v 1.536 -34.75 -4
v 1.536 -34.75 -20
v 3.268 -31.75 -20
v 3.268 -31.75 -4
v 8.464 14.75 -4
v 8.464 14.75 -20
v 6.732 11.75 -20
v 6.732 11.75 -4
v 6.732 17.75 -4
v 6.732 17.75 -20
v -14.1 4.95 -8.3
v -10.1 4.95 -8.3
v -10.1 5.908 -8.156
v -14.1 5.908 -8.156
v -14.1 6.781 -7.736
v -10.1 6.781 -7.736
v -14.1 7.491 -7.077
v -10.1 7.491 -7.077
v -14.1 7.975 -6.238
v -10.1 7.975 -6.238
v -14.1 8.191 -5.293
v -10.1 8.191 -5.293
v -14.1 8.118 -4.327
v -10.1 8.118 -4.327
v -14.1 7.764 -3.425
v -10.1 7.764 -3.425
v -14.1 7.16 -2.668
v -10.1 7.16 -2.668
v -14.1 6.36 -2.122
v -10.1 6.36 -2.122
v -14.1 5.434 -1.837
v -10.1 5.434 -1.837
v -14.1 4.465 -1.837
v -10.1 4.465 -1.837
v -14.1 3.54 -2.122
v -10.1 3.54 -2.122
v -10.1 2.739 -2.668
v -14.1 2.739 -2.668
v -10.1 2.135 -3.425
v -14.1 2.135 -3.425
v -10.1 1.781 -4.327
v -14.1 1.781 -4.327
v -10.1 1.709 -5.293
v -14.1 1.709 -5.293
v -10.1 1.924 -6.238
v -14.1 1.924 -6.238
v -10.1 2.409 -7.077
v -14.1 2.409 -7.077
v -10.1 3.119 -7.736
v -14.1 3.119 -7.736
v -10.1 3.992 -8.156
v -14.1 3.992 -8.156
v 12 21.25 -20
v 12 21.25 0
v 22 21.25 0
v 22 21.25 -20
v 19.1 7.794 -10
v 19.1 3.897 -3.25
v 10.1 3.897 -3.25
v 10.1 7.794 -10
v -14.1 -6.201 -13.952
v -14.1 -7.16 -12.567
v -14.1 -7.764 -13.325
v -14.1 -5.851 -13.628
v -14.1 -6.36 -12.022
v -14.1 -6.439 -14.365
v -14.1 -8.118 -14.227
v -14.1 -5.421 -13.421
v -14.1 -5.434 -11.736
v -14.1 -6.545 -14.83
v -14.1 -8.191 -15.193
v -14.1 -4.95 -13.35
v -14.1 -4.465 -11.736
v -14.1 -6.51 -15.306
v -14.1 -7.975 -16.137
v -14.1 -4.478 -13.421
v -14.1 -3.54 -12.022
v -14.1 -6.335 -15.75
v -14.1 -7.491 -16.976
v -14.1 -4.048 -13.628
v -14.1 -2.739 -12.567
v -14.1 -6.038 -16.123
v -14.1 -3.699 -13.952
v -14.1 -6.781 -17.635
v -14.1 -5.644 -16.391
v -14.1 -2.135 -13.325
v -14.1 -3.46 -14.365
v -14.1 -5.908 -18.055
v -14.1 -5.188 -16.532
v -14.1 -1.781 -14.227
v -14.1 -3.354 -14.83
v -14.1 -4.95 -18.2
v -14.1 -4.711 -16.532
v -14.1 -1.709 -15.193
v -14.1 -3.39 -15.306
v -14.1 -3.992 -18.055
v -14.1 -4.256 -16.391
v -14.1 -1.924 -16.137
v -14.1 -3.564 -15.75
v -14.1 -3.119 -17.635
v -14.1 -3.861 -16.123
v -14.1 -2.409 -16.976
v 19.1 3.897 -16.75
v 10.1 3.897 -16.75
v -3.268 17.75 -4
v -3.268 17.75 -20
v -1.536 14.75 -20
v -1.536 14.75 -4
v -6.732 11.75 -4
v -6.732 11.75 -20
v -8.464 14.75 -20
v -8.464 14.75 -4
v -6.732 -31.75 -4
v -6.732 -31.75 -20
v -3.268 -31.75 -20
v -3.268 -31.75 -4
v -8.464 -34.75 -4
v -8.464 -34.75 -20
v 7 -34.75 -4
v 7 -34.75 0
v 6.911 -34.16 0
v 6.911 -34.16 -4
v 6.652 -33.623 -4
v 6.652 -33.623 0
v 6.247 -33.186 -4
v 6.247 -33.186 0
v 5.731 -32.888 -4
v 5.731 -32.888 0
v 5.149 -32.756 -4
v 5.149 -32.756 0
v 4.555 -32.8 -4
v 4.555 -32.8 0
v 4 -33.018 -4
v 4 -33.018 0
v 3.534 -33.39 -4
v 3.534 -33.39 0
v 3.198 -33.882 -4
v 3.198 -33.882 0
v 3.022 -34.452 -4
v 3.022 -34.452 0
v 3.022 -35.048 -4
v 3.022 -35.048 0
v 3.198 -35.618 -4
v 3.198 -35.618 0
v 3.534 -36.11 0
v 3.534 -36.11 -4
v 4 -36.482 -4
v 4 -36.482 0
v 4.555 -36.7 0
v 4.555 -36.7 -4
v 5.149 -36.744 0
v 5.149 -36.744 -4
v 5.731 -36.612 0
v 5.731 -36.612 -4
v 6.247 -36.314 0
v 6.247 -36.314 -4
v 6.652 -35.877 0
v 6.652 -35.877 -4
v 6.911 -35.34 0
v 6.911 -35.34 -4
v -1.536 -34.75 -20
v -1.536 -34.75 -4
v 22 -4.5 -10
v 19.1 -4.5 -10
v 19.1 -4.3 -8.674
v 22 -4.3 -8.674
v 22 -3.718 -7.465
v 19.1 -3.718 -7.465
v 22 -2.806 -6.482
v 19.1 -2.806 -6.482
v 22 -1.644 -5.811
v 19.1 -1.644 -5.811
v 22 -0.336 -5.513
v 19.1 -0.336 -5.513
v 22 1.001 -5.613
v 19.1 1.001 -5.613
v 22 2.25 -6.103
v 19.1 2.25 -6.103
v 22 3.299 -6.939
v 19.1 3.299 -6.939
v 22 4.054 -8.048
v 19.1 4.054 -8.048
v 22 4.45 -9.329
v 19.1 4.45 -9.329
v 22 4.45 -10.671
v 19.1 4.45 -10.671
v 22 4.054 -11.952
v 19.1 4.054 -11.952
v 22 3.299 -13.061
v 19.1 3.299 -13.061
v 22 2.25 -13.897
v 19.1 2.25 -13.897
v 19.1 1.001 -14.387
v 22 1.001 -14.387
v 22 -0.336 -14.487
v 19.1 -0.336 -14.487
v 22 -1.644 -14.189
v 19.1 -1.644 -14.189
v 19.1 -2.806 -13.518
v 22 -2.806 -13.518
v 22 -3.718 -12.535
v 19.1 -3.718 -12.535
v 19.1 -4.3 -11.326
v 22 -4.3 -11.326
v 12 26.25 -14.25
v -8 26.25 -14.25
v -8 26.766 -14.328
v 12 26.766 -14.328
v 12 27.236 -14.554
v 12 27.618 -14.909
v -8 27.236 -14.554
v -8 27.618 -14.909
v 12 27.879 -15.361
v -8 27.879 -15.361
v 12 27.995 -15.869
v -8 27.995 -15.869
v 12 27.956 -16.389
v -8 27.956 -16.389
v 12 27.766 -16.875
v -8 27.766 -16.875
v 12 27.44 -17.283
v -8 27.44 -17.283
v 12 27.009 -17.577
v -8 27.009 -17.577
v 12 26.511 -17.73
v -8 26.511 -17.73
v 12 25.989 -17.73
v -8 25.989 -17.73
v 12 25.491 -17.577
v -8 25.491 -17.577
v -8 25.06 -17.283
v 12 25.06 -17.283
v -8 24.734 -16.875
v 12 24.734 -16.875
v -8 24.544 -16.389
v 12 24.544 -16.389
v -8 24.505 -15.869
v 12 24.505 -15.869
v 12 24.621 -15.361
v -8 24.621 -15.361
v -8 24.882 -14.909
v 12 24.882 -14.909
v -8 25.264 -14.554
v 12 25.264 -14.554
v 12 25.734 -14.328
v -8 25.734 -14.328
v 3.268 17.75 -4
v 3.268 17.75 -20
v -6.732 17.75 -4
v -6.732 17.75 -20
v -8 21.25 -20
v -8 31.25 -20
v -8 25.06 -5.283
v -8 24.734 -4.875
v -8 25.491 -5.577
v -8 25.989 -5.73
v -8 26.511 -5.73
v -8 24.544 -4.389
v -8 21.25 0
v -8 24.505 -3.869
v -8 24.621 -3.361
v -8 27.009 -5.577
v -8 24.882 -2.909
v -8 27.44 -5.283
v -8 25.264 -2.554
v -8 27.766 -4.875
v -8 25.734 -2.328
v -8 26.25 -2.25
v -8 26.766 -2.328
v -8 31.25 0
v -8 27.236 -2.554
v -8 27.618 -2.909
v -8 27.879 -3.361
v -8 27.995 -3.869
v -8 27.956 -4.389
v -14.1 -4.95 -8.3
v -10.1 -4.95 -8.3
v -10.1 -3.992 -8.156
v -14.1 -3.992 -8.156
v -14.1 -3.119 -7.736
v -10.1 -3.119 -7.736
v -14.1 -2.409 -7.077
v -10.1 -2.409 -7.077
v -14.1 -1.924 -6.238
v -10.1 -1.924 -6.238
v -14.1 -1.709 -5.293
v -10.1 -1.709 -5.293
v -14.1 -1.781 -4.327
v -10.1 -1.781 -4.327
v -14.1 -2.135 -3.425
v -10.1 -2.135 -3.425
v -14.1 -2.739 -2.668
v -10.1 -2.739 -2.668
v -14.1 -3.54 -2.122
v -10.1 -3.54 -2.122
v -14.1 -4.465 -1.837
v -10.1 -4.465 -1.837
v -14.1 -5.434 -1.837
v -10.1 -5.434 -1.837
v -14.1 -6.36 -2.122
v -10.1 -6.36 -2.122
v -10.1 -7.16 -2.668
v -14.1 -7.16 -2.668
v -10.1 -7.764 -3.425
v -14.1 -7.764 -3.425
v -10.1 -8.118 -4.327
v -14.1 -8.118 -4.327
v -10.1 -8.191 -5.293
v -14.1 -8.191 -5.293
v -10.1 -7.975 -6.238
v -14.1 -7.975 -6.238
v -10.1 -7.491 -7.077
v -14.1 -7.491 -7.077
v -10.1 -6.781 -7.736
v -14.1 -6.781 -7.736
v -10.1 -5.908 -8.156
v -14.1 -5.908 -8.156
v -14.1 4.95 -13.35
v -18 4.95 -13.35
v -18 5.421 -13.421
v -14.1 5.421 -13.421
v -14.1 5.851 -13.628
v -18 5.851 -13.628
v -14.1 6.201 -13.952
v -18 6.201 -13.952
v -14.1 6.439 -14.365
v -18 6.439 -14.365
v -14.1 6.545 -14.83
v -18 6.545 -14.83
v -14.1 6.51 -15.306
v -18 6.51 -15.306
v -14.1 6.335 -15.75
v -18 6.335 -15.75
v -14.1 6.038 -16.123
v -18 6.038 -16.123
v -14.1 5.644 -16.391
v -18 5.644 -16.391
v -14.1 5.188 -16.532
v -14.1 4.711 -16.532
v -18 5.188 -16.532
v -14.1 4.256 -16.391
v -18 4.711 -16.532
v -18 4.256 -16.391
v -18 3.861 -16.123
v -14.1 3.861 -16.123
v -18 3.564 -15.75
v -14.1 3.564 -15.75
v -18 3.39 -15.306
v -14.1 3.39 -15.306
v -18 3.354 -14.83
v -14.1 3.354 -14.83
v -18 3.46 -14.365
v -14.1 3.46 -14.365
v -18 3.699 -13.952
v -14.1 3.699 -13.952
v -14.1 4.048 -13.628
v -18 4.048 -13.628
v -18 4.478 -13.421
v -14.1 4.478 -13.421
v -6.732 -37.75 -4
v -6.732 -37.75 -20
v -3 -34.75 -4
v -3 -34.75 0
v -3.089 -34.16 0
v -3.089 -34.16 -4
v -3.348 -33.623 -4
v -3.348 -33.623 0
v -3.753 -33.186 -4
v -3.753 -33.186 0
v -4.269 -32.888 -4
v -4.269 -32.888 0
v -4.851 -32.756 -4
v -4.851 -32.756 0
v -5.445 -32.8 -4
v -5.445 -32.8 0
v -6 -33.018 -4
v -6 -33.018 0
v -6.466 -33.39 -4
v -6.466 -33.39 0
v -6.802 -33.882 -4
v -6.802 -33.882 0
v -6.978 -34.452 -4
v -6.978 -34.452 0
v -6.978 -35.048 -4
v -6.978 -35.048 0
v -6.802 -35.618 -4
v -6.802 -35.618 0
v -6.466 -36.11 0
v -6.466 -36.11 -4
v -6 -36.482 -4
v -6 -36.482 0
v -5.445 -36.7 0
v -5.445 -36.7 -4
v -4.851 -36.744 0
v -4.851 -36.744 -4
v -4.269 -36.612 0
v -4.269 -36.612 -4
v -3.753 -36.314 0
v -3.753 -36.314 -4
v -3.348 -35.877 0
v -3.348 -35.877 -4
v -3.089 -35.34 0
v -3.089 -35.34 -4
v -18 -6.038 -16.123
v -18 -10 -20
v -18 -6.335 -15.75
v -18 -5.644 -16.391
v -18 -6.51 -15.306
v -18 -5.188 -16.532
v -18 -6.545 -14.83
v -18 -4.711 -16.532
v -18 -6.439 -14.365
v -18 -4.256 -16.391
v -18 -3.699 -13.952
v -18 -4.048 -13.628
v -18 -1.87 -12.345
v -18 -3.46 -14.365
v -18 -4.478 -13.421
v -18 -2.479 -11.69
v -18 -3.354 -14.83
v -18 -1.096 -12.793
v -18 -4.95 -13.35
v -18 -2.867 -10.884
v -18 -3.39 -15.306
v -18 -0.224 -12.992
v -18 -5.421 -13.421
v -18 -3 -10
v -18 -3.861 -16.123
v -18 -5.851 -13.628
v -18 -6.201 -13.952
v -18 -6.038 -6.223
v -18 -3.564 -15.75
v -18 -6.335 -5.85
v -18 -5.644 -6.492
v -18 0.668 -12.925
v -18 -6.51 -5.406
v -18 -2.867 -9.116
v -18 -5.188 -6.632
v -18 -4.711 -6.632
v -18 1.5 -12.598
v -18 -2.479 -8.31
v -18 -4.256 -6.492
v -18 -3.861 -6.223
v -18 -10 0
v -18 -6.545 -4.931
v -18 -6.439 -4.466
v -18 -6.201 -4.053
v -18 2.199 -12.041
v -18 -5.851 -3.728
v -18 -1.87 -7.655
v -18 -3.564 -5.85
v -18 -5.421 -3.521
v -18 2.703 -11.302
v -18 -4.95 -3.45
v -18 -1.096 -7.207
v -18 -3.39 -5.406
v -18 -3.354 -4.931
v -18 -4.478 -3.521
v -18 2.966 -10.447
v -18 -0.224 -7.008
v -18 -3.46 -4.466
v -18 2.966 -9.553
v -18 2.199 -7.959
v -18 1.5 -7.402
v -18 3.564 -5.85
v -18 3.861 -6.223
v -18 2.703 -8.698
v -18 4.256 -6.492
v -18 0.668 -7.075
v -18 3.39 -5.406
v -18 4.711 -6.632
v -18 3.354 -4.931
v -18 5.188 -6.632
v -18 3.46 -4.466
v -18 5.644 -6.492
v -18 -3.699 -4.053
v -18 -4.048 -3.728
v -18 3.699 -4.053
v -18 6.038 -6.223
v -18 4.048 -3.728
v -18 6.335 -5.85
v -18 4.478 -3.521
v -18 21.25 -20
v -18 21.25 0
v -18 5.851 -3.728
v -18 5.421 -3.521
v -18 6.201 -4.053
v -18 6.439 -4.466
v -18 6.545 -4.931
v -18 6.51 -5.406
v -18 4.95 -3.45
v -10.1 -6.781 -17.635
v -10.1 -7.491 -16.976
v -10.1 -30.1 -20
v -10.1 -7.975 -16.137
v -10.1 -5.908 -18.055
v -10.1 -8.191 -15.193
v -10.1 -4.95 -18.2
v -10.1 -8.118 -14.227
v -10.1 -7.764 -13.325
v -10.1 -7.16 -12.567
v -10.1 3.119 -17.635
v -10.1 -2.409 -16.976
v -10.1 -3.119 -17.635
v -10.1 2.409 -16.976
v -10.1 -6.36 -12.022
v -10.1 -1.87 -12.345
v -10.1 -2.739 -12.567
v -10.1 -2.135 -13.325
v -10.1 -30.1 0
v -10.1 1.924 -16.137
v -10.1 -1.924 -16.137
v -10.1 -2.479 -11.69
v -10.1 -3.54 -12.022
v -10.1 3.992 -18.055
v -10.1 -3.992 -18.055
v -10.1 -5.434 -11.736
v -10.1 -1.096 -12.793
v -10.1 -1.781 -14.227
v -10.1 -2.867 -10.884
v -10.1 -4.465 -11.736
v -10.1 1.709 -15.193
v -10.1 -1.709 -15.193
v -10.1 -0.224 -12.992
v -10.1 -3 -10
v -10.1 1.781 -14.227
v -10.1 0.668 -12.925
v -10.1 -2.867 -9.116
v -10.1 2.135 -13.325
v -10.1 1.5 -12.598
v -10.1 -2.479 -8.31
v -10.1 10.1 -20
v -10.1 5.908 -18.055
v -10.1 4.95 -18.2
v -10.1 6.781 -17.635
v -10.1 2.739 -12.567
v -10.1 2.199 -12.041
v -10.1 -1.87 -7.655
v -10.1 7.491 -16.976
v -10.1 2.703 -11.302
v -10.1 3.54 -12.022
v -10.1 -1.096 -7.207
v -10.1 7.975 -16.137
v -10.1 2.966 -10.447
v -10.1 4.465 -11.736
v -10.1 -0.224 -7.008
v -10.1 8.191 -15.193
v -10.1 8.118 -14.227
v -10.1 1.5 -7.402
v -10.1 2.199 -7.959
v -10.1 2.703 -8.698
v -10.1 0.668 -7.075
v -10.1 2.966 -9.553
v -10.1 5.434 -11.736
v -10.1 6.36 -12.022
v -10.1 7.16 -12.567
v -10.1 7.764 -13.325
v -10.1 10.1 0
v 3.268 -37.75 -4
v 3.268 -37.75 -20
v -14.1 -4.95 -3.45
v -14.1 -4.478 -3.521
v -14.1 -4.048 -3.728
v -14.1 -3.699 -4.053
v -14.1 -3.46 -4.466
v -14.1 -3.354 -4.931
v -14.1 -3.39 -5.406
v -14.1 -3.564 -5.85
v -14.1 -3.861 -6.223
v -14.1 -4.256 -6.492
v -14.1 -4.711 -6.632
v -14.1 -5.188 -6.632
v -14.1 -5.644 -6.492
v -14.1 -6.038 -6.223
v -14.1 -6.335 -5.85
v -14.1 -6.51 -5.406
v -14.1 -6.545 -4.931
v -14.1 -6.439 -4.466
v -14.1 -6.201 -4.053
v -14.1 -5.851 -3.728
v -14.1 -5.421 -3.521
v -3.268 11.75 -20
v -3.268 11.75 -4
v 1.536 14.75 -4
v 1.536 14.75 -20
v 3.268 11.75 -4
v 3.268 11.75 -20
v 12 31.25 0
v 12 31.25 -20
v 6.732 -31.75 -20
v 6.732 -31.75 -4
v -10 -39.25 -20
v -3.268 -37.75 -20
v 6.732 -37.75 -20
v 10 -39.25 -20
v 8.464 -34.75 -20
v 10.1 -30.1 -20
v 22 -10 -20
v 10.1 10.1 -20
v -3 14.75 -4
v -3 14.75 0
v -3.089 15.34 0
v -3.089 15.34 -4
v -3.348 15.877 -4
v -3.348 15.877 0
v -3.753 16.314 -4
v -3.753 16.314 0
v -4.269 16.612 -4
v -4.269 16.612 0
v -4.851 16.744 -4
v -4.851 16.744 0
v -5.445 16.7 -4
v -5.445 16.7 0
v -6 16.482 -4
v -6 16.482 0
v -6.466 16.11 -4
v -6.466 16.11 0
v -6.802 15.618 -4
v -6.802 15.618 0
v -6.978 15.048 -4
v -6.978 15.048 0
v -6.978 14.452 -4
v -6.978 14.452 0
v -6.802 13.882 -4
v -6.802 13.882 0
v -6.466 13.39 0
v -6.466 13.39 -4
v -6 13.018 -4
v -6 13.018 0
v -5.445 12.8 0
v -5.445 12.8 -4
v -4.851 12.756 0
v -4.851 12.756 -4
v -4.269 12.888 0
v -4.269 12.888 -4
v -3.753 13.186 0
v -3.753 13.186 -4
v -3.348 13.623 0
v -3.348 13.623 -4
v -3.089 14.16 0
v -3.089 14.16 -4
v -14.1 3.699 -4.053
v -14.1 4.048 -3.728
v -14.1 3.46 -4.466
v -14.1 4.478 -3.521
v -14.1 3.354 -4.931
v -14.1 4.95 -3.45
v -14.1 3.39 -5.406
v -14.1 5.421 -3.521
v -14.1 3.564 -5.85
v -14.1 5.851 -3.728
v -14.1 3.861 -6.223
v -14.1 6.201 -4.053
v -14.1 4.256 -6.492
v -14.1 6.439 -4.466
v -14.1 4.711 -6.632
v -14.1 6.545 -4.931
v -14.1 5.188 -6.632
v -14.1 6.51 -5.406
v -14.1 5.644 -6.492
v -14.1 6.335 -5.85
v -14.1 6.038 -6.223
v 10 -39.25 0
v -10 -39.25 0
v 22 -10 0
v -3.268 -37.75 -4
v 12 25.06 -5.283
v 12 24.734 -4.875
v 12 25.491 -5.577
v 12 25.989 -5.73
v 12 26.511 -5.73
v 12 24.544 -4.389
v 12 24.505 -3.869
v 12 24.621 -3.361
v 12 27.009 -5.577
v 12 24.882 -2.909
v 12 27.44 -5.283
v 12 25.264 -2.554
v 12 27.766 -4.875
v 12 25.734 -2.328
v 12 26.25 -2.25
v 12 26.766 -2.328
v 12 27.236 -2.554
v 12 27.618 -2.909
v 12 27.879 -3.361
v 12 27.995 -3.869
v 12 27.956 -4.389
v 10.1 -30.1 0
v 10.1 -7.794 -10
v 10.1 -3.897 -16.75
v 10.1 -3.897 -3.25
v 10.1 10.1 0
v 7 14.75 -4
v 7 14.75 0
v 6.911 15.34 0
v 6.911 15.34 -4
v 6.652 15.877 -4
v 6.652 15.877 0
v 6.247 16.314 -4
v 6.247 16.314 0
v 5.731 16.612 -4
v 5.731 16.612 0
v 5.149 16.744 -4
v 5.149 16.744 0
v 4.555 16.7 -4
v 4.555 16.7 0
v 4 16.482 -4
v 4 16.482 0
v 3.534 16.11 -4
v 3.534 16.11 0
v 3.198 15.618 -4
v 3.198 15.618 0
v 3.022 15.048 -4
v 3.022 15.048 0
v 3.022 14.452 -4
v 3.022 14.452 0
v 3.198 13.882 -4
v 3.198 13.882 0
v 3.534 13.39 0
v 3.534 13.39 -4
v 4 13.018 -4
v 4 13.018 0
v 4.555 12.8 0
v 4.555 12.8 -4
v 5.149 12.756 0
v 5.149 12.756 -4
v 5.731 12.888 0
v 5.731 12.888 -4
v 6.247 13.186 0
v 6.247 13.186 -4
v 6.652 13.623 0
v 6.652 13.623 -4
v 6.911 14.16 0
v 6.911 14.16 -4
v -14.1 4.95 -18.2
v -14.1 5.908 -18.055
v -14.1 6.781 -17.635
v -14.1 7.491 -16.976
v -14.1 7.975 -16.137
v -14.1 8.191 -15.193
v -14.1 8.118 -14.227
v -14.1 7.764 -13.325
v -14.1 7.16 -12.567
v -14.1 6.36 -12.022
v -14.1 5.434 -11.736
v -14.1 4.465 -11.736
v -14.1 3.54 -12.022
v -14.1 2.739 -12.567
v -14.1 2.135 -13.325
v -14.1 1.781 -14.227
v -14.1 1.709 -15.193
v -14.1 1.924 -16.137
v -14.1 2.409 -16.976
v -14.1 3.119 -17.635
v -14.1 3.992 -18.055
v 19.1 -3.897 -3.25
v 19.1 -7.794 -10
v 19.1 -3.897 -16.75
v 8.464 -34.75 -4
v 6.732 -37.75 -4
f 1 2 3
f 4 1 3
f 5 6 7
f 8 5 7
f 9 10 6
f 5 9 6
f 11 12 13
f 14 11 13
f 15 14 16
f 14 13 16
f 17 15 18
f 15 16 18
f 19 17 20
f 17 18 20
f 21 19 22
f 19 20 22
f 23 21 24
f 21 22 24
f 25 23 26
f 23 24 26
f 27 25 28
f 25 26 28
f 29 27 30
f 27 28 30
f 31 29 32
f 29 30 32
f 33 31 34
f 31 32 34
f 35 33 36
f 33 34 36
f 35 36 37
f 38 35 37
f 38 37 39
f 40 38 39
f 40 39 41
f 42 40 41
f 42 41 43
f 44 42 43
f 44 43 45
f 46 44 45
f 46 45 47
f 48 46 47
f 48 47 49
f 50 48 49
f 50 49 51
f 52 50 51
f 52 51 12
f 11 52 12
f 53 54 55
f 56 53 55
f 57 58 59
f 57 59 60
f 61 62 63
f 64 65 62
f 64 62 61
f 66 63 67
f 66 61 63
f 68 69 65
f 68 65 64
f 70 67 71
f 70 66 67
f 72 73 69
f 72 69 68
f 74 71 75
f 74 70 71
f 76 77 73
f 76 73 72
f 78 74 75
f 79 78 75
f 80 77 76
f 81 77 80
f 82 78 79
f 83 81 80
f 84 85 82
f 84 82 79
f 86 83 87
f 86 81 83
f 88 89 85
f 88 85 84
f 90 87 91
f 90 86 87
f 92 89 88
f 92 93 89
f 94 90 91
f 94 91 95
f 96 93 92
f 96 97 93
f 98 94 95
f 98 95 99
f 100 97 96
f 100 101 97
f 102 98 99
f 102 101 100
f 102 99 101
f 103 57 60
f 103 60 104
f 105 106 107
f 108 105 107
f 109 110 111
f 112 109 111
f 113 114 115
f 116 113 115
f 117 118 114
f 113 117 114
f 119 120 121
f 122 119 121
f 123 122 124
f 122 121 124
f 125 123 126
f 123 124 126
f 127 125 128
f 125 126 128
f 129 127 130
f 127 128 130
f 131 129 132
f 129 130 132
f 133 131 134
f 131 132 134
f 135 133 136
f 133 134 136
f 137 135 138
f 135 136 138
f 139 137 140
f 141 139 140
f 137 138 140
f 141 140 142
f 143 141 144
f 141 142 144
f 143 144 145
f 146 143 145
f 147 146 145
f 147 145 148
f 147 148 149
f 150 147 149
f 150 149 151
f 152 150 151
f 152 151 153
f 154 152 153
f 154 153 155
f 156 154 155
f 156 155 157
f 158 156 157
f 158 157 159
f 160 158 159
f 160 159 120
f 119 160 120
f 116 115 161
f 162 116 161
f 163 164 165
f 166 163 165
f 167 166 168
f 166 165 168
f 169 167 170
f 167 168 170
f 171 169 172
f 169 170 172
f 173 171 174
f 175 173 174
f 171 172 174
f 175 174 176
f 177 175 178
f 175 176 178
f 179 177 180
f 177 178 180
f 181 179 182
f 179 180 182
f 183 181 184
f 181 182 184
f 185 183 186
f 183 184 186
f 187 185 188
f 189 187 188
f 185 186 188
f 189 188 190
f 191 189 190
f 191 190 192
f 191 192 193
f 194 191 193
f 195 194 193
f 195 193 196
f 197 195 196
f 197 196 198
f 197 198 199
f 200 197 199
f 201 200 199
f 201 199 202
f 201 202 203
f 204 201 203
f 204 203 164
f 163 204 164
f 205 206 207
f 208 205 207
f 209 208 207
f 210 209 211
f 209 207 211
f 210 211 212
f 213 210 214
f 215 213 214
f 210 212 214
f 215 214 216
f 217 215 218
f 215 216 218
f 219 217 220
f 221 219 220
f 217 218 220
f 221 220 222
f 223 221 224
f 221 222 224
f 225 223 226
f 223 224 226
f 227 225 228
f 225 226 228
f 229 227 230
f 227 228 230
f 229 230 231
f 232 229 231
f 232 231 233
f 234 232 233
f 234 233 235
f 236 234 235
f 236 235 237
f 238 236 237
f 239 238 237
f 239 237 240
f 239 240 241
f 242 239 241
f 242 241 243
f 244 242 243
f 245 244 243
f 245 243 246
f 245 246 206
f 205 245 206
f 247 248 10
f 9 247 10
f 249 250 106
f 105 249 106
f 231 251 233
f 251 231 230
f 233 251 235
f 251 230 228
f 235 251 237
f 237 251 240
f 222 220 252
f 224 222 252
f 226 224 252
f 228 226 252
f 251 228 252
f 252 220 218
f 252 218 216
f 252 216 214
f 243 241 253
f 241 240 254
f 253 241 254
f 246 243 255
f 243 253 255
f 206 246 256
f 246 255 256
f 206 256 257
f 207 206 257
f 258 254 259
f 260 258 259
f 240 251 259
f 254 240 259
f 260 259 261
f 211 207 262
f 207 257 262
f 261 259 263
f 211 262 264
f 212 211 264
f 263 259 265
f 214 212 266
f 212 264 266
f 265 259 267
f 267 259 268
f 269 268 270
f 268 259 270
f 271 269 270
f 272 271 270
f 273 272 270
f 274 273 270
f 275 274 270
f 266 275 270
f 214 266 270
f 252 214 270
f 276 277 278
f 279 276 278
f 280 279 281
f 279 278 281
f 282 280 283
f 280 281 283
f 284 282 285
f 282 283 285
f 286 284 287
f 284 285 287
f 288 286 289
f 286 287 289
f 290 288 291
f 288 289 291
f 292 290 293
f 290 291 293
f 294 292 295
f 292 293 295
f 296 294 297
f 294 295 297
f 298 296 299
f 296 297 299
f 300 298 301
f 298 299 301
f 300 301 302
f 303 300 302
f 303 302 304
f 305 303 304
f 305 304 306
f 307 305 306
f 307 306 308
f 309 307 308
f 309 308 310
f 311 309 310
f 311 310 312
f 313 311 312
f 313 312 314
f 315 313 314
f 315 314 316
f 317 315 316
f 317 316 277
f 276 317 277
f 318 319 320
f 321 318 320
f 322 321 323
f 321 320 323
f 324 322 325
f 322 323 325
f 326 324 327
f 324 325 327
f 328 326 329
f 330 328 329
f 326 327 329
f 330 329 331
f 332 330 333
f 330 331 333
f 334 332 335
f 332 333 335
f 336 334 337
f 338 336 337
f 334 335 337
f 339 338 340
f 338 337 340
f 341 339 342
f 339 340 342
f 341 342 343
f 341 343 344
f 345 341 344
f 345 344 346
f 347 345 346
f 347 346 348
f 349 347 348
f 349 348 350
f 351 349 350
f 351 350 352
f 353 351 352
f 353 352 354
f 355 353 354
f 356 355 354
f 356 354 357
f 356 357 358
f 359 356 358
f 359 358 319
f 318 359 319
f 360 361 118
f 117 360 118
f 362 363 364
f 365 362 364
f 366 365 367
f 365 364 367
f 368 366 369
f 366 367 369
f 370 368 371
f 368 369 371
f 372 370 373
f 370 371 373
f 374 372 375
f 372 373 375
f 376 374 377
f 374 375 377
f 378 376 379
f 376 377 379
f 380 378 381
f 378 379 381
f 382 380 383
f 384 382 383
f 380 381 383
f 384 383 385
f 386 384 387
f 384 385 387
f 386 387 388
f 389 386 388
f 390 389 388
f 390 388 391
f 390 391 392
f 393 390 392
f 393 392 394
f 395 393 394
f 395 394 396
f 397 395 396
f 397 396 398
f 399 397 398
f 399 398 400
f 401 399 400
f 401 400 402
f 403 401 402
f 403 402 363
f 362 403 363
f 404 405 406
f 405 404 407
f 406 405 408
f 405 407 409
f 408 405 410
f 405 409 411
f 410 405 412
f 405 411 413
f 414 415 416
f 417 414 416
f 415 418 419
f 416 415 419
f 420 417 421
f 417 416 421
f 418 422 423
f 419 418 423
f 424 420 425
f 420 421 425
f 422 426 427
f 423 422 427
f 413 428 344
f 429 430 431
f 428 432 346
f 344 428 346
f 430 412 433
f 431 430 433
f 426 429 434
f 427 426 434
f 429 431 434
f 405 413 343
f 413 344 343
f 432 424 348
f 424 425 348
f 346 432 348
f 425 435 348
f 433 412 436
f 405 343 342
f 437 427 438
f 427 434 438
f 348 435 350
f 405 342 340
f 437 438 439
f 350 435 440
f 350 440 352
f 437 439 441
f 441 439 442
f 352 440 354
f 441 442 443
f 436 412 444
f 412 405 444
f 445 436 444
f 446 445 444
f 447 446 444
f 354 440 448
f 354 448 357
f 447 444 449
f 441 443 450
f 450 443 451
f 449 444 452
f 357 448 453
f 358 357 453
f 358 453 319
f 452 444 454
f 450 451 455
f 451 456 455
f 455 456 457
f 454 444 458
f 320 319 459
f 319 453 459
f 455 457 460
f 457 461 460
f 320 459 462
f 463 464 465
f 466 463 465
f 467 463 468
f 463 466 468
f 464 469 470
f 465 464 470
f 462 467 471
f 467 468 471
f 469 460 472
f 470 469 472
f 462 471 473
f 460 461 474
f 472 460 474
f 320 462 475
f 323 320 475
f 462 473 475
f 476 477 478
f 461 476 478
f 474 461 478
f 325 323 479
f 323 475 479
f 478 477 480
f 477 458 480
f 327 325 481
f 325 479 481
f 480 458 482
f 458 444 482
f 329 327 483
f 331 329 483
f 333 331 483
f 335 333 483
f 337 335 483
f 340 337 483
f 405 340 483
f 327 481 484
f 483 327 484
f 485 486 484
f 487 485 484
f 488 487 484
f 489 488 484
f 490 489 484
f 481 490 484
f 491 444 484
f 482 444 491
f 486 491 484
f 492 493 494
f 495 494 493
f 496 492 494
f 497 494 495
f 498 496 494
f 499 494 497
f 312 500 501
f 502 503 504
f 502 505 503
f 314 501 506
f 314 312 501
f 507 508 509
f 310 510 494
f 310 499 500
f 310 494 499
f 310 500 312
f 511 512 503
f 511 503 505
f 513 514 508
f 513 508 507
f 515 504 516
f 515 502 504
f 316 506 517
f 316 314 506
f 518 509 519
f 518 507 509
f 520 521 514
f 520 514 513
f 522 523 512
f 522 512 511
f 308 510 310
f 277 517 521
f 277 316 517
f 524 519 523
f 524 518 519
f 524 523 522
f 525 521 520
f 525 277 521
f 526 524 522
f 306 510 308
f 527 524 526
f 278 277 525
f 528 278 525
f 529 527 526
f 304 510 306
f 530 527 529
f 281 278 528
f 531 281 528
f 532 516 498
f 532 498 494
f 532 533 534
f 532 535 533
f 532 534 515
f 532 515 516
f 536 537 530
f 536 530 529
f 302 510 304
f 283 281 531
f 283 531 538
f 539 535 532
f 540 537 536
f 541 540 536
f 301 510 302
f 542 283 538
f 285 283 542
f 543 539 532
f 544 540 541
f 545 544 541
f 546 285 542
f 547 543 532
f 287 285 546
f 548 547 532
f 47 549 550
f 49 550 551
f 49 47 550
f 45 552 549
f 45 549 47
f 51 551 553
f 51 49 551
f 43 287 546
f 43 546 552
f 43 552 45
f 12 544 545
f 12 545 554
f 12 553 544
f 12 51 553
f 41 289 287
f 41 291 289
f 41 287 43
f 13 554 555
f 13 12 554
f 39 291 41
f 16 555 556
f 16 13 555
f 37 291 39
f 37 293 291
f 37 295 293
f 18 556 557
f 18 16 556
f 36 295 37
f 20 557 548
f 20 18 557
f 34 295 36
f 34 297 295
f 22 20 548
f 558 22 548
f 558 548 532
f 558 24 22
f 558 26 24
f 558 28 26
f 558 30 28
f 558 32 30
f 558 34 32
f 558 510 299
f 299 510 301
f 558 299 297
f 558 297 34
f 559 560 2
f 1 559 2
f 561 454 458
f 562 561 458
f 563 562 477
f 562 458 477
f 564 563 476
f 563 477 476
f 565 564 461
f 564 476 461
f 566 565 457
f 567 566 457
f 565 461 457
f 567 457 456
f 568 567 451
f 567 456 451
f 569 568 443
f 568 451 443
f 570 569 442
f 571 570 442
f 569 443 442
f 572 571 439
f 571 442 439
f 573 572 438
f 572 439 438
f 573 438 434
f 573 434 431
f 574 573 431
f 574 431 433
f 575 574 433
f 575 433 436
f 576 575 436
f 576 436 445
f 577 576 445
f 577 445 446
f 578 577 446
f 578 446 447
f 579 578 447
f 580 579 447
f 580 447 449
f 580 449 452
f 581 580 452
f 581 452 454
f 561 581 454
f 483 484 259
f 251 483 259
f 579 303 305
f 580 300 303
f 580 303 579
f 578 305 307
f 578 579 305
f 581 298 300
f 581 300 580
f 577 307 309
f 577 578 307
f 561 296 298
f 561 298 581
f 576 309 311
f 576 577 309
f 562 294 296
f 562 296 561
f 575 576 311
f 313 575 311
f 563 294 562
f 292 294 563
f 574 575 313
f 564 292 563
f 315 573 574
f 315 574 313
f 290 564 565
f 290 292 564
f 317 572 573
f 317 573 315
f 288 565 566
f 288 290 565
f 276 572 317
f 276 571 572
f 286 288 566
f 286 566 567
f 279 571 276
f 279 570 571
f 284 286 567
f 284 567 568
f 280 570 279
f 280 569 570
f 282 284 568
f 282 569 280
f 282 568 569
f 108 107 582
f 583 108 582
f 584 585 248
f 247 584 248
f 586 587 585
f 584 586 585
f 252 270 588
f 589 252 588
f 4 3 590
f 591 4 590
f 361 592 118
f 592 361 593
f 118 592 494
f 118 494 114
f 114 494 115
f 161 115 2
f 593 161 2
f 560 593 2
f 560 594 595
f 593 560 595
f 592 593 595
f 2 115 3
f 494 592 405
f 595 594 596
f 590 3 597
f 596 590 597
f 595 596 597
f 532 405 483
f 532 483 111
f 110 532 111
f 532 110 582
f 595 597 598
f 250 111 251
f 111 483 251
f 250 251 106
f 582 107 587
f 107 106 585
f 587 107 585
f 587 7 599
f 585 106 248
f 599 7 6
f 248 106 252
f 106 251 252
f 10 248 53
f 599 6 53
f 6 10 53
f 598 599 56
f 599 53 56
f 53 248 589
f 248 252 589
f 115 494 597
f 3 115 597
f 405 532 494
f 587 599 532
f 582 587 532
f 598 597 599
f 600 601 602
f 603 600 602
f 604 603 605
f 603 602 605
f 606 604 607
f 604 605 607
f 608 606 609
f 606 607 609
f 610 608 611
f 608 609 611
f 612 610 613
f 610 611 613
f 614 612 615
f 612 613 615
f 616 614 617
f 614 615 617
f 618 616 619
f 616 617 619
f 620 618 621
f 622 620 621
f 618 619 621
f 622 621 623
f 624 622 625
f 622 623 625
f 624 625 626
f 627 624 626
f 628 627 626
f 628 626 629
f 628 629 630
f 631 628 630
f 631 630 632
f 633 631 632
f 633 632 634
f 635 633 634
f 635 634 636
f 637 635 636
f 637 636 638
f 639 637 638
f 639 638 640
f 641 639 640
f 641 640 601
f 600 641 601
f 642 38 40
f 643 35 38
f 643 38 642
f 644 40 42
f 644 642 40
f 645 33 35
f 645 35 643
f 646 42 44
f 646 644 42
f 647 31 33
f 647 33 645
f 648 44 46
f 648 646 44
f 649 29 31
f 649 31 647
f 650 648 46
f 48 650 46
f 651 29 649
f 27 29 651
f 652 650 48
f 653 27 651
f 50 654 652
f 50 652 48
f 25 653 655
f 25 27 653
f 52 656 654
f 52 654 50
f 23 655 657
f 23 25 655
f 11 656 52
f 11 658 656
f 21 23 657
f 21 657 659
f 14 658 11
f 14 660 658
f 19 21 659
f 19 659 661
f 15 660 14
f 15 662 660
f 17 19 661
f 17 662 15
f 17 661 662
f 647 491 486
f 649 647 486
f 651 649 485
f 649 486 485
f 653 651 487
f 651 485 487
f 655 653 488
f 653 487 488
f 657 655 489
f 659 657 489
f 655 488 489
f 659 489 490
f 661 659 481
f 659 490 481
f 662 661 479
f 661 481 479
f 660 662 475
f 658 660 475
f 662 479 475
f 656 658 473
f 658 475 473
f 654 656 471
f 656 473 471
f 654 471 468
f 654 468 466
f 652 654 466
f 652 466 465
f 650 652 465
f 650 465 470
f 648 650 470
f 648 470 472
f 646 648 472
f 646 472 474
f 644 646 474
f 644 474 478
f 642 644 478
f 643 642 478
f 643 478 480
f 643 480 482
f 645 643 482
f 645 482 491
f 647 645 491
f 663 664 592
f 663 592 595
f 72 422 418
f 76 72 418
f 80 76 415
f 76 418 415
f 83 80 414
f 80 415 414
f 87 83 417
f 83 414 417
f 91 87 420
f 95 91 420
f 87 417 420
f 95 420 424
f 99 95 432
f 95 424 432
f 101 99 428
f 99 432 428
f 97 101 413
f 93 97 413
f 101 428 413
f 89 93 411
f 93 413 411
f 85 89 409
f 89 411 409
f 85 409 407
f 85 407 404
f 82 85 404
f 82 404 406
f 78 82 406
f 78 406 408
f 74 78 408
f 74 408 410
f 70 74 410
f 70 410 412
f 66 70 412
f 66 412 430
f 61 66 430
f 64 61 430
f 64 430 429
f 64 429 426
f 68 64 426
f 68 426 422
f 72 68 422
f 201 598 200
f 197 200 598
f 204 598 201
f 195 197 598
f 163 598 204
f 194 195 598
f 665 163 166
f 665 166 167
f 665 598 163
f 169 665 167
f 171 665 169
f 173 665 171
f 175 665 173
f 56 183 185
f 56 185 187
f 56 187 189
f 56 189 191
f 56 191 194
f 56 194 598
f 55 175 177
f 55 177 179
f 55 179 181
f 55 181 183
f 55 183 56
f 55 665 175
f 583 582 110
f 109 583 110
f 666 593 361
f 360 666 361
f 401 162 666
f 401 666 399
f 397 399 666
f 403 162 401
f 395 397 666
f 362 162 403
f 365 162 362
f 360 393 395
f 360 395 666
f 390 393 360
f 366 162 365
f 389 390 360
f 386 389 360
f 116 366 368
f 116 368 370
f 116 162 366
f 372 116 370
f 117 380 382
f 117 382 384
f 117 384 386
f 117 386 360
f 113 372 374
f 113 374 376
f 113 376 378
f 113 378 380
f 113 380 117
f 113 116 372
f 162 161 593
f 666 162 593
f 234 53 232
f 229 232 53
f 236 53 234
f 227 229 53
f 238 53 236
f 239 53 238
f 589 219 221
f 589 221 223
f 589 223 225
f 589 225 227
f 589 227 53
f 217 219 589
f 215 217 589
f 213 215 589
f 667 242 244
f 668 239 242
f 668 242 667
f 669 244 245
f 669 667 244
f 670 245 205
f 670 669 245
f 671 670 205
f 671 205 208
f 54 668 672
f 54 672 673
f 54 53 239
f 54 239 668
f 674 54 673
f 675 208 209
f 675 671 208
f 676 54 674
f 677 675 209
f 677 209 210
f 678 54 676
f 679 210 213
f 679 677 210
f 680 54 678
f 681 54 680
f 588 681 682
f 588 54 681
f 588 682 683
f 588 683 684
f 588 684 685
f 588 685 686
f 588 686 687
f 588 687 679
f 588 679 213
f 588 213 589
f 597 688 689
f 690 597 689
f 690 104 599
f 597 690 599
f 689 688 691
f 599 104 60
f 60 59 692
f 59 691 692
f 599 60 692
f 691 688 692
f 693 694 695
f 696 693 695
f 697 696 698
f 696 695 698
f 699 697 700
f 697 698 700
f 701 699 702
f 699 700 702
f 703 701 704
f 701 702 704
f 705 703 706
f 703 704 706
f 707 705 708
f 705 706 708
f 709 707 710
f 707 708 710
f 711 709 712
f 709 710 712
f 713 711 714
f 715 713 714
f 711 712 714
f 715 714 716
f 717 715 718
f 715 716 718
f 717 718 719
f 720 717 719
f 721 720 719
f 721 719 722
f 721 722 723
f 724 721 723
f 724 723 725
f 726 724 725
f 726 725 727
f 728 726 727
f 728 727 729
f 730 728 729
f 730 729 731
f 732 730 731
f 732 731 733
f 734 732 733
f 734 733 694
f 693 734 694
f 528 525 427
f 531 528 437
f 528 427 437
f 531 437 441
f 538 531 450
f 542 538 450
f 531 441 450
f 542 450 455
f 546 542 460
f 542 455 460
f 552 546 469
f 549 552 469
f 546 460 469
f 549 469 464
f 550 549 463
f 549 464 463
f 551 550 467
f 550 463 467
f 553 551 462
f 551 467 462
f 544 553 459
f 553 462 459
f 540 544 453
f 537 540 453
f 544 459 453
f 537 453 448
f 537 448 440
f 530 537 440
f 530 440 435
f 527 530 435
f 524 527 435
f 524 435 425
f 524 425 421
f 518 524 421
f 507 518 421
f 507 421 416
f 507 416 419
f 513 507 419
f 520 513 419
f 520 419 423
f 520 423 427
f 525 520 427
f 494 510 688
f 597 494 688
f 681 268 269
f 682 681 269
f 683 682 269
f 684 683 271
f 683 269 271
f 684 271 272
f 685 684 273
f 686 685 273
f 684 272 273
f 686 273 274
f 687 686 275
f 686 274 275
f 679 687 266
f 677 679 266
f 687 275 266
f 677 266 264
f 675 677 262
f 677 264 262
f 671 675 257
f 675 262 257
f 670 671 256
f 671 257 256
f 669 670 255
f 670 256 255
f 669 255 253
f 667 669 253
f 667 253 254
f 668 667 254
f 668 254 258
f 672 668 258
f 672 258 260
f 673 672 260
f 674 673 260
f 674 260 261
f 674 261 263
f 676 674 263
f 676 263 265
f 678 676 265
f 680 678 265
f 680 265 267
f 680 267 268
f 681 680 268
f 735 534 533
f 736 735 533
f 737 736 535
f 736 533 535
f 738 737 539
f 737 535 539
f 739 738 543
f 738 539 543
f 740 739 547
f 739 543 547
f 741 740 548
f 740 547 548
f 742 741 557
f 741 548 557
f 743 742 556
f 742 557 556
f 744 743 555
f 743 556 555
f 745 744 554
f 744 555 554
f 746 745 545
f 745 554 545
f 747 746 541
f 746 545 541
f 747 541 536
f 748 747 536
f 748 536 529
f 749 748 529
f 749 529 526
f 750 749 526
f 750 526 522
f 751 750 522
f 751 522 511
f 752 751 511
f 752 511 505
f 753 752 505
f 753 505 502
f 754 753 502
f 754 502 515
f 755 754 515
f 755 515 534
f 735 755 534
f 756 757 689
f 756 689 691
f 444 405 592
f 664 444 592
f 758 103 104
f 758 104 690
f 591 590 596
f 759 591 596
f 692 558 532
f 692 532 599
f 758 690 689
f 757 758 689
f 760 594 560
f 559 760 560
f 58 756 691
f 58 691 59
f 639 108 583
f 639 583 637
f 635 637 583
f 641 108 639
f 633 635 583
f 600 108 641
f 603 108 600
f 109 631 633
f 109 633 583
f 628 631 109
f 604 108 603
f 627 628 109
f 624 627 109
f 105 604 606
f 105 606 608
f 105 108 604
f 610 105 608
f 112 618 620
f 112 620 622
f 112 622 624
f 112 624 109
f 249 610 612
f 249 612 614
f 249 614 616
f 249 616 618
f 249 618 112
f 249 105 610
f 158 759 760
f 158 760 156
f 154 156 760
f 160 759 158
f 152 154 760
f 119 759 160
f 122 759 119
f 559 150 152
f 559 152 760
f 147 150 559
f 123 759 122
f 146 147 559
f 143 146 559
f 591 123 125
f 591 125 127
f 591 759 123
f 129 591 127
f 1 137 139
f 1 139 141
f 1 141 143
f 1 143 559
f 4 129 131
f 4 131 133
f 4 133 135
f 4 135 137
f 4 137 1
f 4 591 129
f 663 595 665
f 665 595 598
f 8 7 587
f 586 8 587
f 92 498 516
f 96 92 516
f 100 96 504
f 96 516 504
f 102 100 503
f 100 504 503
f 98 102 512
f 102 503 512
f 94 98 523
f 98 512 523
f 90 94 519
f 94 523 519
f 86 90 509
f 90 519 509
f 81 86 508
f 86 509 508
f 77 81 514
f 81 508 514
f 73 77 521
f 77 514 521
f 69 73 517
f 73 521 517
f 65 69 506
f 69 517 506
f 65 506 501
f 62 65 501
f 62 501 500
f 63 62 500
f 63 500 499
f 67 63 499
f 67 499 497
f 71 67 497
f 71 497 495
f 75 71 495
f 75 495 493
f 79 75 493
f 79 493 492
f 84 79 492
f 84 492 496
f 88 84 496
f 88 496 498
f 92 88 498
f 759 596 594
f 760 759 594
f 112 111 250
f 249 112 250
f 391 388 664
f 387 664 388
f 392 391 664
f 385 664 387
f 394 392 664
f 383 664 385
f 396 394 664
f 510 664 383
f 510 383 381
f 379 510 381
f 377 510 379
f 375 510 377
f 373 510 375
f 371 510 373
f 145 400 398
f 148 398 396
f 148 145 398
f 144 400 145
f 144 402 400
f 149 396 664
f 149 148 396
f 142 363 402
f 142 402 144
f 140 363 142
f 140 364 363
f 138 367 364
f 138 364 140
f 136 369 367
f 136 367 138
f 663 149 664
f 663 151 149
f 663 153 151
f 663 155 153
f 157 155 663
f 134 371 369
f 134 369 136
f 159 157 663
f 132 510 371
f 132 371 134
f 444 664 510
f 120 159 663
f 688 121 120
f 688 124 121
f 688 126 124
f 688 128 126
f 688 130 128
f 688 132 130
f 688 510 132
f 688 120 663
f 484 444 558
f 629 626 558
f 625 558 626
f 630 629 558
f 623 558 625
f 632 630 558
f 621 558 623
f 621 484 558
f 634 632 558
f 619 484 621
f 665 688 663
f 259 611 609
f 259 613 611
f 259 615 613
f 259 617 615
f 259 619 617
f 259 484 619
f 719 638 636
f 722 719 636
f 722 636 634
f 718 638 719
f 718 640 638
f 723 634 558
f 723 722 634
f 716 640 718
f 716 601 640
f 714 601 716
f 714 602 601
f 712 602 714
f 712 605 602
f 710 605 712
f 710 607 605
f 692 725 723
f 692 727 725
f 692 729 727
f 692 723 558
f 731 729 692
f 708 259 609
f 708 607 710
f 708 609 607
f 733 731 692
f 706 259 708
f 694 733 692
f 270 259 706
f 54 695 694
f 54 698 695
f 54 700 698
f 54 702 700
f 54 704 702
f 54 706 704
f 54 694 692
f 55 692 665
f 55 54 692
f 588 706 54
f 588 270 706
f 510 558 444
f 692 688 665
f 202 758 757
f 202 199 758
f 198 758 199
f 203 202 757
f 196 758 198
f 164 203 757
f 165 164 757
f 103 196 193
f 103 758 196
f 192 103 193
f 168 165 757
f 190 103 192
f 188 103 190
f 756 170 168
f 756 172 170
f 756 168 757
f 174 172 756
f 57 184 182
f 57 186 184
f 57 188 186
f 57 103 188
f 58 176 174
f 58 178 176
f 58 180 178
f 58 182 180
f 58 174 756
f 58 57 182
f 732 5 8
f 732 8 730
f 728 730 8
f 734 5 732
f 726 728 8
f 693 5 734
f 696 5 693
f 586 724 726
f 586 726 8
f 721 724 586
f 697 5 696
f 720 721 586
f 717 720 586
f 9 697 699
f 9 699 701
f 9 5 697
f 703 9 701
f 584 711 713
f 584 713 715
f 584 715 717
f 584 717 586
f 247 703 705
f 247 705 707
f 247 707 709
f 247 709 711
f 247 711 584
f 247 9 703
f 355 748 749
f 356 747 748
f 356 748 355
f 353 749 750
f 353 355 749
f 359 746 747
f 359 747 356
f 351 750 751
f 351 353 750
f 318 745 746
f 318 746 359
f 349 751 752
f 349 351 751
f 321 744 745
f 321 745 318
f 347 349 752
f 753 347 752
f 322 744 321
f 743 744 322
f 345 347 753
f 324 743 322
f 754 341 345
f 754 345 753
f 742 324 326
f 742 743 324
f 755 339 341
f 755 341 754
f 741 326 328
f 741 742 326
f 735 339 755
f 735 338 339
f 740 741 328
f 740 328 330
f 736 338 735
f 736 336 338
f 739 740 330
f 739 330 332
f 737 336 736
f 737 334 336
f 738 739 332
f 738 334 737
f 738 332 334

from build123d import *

# Parameters (mm, degrees)
SKETCH1_W                                           = 40
SKETCH1_H                                           = 70.5
BOSS_EXTRUDE1_DEPTH                                 = 20
SKETCH2_W                                           = 20.2
SKETCH2_H                                           = 40.2
CUT_EXTRUDE1_DEPTH                                  = 30
CBORE_FOR_M3_HEX_SOCKET_HEAD_CAP_SCREW1_D           = 3.2
CBORE_FOR_M3_HEX_SOCKET_HEAD_CAP_SCREW1_DEPTH       = 7.9
CBORE_FOR_M3_HEX_SOCKET_HEAD_CAP_SCREW1_CBORE_D     = 6.5
CBORE_FOR_M3_HEX_SOCKET_HEAD_CAP_SCREW1_CBORE_DEPTH = 4
CUT_EXTRUDE2_DEPTH                                  = 9
SKETCH8_R                                           = 4.5
CUT_EXTRUDE3_DEPTH                                  = 58.593163657
CUT_EXTRUDE4_DEPTH                                  = 50.239846669
CUT_EXTRUDE4_DEPTH_BACK                             = 50.239846669
SKETCH12_R                                          = 2
CUT_EXTRUDE5_DEPTH                                  = 50.239846669
CUT_EXTRUDE6_DEPTH                                  = 16
SKETCH15_W                                          = 10
SKETCH15_H                                          = 10
CUT_EXTRUDE7_DEPTH                                  = 50.239846669
SKETCH16_R                                          = 1.75
CUT_EXTRUDE8_DEPTH                                  = 54.296927679
CUT_EXTRUDE9_REACH                                  = 61.503
SKETCH17_R                                          = 3


with BuildPart() as part:
    # Sketch1 → Boss-Extrude1 (new body)
    with BuildSketch(Plane.XY):
        with Locations((2, -4)):
            Rectangle(SKETCH1_W, SKETCH1_H)
    extrude(amount=-BOSS_EXTRUDE1_DEPTH)

    # Sketch2 → Cut-Extrude1 (cut)
    with BuildSketch(Plane.XY):
        with Locations((0, -10)):
            Rectangle(SKETCH2_W, SKETCH2_H)
    extrude(amount=-CUT_EXTRUDE1_DEPTH, mode=Mode.SUBTRACT)

    # CBORE for M3 Hex Socket Head Cap Screw1
    with Locations(Plane(origin=(-10.1, 0, 0), x_dir=(0, 0, -1), z_dir=(1, 0, 0))):
        with Locations((5.050252532, 4.949747468), (14.949747468, 4.949747468), (14.949747468, -4.949747468), (5.050252532, -4.949747468)):
            CounterBoreHole(CBORE_FOR_M3_HEX_SOCKET_HEAD_CAP_SCREW1_D / 2, CBORE_FOR_M3_HEX_SOCKET_HEAD_CAP_SCREW1_CBORE_D / 2, CBORE_FOR_M3_HEX_SOCKET_HEAD_CAP_SCREW1_CBORE_DEPTH, depth=CBORE_FOR_M3_HEX_SOCKET_HEAD_CAP_SCREW1_DEPTH)

    # Sketch7 → Cut-Extrude2 (cut)
    with BuildSketch(Plane.ZY.offset(-10.1)):
        Polygon((-10, 7.794228634), (-16.75, 3.897114317), (-16.75, -3.897114317), (-10, -7.794228634), (-3.25, -3.897114317), (-3.25, 3.897114317), align=None)
    extrude(amount=-CUT_EXTRUDE2_DEPTH, mode=Mode.SUBTRACT)

    # Sketch8 → Cut-Extrude3 (cut, through all)
    with BuildSketch(Plane.ZY.offset(-19.1)):
        with Locations(Location((-10, 0, 0), (0, 0, 270))):
            Circle(SKETCH8_R)
    extrude(amount=-CUT_EXTRUDE3_DEPTH, mode=Mode.SUBTRACT)

    # Sketch9 → Cut-Extrude4 (cut, two sides: drawn at the far end of the back side and taken through both)
    with BuildSketch(Plane.XY.offset(-CUT_EXTRUDE4_DEPTH_BACK)):
        Polygon((-18, -10), (-10, -39.25), (-18, -39.25), align=None)
        Polygon((10, -39.25), (22, -10), (22, -39.25), align=None)
    extrude(amount=CUT_EXTRUDE4_DEPTH + CUT_EXTRUDE4_DEPTH_BACK, mode=Mode.SUBTRACT)

    # Sketch12 → Cut-Extrude5 (cut, through all)
    with BuildSketch(Plane.XY):
        with Locations((-5, -34.75)):
            Circle(SKETCH12_R)
        with Locations((5, -34.75)):
            Circle(SKETCH12_R)
        with Locations((5, 14.75)):
            Circle(SKETCH12_R)
        with Locations((-5, 14.75)):
            Circle(SKETCH12_R)
    extrude(amount=-CUT_EXTRUDE5_DEPTH, mode=Mode.SUBTRACT)

    # Sketch13 → Cut-Extrude6 (cut)
    with BuildSketch(Plane(origin=(0, 0, -20), x_dir=(-1, 0, 0), z_dir=(0, 0, -1))):
        Polygon((-1.535898385, 14.75), (-3.267949192, 17.75), (-6.732050808, 17.75), (-8.464101615, 14.75), (-6.732050808, 11.75), (-3.267949192, 11.75), align=None)
        Polygon((3.267949192, 17.75), (1.535898385, 14.75), (3.267949192, 11.75), (6.732050808, 11.75), (8.464101615, 14.75), (6.732050808, 17.75), align=None)
        Polygon((-6.732050808, -31.75), (-8.464101615, -34.75), (-6.732050808, -37.75), (-3.267949192, -37.75), (-1.535898385, -34.75), (-3.267949192, -31.75), align=None)
        Polygon((3.267949192, -31.75), (1.535898385, -34.75), (3.267949192, -37.75), (6.732050808, -37.75), (8.464101615, -34.75), (6.732050808, -31.75), align=None)
    extrude(amount=-CUT_EXTRUDE6_DEPTH, mode=Mode.SUBTRACT)

    # Sketch15 → Cut-Extrude7 (cut, through all)
    with BuildSketch(Plane.XY):
        with Locations((-13, 26.25)):
            Rectangle(SKETCH15_W, SKETCH15_H)
        with Locations((17, 26.25)):
            Rectangle(SKETCH15_W, SKETCH15_H)
    extrude(amount=-CUT_EXTRUDE7_DEPTH, mode=Mode.SUBTRACT)

    # Sketch16 → Cut-Extrude8 (cut, through all)
    with BuildSketch(Plane.ZY.offset(8)):
        with Locations((-16, 26.25)):
            Circle(SKETCH16_R)
        with Locations((-4, 26.25)):
            Circle(SKETCH16_R)
    extrude(amount=-CUT_EXTRUDE8_DEPTH, mode=Mode.SUBTRACT)

    # Sketch17 → Cut-Extrude9 (cut, up to next)
    with BuildSketch(Plane.ZY.offset(18), mode=Mode.PRIVATE) as cut_extrude9_sk1:
        with Locations(Location((-10, 0, 0), (0, 0, 270))):
            Circle(SKETCH17_R)
    cut_extrude9_tool1 = extrude(cut_extrude9_sk1.sketch, amount=-CUT_EXTRUDE9_REACH, mode=Mode.PRIVATE) & part.part
    add(cut_extrude9_tool1.solids().sort_by_distance((-18, 0, -10))[0], mode=Mode.SUBTRACT)


solid = part.part
